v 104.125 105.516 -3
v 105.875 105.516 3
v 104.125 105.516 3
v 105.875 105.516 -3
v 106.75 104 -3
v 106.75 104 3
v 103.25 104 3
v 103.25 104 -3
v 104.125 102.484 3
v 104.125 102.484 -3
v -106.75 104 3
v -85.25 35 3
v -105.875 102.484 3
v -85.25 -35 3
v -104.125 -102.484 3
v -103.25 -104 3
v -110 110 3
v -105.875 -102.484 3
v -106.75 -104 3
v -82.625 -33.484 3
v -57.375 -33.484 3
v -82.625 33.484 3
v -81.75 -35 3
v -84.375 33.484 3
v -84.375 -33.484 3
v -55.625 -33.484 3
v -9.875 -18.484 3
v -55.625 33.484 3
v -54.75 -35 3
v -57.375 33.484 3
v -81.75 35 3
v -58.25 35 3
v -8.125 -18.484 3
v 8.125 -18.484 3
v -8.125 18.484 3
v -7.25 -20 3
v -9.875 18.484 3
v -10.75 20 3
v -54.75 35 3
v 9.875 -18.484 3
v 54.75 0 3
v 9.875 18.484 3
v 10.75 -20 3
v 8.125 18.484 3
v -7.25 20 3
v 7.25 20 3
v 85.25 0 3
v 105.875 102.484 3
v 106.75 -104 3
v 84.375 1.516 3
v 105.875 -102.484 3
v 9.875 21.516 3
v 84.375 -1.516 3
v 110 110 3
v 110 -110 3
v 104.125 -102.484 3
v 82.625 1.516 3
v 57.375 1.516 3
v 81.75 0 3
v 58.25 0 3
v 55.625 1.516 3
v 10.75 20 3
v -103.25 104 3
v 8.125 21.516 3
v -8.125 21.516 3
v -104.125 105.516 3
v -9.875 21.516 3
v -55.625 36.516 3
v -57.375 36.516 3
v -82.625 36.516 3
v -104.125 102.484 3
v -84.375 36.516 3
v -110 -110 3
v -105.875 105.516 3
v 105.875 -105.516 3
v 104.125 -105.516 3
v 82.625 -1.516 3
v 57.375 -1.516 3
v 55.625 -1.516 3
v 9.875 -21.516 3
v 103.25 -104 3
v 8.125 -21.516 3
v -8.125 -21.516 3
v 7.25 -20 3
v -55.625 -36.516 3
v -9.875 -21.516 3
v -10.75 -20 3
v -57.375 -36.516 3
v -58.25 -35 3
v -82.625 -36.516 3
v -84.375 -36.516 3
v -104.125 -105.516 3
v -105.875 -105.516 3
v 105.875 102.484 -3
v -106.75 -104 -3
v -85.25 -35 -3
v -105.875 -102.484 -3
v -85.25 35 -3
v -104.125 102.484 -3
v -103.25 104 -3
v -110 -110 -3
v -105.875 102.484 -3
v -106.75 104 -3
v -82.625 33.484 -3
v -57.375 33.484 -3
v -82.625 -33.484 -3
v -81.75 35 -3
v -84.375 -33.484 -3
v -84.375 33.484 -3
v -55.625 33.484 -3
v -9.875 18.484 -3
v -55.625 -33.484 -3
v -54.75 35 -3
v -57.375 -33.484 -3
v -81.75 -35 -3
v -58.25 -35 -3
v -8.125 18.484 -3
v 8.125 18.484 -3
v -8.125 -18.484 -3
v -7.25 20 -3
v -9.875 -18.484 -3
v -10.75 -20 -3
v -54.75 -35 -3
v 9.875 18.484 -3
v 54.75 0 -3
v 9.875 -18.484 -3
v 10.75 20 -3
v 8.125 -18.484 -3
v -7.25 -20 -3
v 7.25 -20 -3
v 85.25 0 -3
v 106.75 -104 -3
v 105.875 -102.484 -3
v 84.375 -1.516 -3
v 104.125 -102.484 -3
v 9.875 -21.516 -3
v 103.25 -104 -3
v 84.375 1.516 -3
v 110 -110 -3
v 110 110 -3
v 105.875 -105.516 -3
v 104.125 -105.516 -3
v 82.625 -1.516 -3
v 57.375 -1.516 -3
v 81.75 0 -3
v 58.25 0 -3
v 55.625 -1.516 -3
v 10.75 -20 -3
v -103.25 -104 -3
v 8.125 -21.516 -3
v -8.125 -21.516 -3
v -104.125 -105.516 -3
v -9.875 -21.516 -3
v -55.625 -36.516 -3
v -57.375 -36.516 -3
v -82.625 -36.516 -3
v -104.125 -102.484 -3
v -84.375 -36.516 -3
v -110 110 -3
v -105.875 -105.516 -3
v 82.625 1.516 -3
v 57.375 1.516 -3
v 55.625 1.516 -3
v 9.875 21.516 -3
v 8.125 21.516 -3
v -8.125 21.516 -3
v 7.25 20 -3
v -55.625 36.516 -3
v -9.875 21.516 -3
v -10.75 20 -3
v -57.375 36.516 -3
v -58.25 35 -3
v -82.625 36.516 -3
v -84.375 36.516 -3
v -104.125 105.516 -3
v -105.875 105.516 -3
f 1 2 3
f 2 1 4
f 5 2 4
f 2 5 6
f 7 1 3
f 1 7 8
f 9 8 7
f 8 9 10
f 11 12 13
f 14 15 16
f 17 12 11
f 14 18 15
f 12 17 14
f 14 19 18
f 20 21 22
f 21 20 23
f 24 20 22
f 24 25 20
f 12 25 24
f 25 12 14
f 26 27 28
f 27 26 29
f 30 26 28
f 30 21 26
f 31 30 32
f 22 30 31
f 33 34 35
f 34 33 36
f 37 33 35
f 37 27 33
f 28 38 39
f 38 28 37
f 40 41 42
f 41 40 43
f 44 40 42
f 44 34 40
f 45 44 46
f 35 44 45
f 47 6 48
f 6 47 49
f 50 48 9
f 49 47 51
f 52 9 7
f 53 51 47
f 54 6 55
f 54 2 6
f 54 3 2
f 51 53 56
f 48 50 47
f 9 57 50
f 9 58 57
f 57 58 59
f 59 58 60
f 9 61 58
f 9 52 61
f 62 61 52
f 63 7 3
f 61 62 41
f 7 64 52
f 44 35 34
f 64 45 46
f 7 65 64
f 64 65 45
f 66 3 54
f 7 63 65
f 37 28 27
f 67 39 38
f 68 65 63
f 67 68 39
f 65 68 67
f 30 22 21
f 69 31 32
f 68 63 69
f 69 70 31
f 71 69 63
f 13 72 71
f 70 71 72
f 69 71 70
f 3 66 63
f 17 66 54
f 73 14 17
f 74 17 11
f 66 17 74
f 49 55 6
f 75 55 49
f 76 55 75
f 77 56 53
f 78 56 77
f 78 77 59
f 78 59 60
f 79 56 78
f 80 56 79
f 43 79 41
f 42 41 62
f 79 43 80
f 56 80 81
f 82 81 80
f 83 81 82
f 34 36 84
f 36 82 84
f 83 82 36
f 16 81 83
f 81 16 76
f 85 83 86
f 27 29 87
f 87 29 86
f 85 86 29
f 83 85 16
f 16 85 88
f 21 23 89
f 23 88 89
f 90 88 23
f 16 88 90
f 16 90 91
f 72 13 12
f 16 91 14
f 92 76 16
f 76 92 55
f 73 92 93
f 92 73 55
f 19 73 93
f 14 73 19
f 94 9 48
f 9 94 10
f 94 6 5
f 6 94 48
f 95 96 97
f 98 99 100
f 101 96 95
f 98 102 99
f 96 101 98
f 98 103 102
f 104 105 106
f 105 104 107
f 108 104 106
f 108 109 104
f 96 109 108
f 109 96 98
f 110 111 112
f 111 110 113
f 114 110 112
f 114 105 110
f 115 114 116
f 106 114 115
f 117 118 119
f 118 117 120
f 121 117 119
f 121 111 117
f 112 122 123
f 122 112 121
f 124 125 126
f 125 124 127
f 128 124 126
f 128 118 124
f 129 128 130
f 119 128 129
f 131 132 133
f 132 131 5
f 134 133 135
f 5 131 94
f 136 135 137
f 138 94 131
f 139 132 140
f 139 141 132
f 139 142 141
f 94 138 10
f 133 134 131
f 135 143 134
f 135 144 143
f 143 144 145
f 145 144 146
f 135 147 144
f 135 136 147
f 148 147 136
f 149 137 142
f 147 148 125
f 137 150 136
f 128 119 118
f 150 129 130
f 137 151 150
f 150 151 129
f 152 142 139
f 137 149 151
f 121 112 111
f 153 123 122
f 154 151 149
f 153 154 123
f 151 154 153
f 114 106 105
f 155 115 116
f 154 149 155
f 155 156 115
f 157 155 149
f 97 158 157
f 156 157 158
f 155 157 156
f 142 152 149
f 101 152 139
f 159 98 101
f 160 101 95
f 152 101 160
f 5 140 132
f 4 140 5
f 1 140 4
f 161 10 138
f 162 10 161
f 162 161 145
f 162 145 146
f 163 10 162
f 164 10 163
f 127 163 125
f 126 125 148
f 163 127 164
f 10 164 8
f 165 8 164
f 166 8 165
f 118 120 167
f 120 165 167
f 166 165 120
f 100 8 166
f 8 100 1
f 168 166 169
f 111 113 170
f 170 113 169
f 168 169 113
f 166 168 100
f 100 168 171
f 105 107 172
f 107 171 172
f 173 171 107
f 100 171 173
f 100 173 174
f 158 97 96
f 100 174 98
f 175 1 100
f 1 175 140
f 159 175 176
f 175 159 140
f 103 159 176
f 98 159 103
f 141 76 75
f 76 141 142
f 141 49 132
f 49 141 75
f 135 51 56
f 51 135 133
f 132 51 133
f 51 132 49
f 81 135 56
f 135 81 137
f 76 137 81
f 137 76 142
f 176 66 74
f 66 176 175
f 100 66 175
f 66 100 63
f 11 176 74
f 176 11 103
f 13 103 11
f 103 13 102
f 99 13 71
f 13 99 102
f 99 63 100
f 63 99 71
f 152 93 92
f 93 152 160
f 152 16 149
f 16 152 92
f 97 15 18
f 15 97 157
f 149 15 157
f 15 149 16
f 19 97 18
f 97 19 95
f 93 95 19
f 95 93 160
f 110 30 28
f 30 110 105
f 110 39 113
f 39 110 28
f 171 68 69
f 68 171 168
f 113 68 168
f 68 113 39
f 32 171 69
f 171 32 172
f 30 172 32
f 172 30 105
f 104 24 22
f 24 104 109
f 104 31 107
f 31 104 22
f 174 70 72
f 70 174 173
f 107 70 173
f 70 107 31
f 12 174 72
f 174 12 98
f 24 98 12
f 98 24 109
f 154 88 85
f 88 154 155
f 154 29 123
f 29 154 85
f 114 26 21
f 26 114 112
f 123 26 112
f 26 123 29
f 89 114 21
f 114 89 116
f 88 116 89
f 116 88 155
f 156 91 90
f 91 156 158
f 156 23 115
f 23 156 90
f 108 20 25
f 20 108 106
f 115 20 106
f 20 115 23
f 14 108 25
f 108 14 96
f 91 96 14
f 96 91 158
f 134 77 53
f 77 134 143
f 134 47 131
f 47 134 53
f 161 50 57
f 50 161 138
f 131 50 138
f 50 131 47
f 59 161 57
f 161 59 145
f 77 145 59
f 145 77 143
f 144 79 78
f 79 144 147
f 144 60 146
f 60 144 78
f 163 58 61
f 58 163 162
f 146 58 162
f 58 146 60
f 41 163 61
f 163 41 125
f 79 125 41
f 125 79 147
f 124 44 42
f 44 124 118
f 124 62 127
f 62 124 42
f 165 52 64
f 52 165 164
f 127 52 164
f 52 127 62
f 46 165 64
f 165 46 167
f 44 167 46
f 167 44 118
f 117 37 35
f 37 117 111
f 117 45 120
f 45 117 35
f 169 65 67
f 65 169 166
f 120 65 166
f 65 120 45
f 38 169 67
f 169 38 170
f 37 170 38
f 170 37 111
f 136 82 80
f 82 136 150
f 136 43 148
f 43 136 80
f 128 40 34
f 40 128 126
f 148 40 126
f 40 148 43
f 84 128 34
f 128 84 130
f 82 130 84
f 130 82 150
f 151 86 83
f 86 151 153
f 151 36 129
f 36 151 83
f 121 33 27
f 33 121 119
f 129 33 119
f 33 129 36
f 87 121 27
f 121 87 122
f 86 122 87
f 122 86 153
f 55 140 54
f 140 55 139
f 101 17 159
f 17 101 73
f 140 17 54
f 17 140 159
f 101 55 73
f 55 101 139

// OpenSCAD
bed_length_x = 220;
bed_length_y = 220;

corner_hole_spacing_x = 210;
corner_hole_spacing_y = 208;

bearing_holes_spacing = 27;
bearing_positions = [
	[-(bed_length_x/2)+40,(bed_length_y/2)-75],
	[-(bed_length_x/2)+40,-(bed_length_y/2)+75],
	[bed_length_x/2-40,0]];

belt_clamp_spacing = 18;
belt_clamp_positions = [
	[0,(bed_length_y/2)-90],
	[0,-(bed_length_y/2)+90]];

bed_height = 6;
m3_size = 3.5;

difference() {
	cube([bed_length_x,bed_length_y,bed_height], center=true);
	corner_holes();
	bearing_holes();
	belt_clamps();
}

module corner_holes() {
	translate([corner_hole_spacing_x/2,corner_hole_spacing_y/2,0]) m3();
	translate([corner_hole_spacing_x/2,-corner_hole_spacing_y/2,0]) m3();
	translate([-corner_hole_spacing_x/2,corner_hole_spacing_y/2,0]) m3();
	translate([-corner_hole_spacing_x/2,-corner_hole_spacing_y/2,0]) m3();
}

module bearing_holes() {
	for(pos=bearing_positions)
		translate([pos[0],pos[1],0]) single_bearing_hole();
}

module belt_clamps() {
	for(pos=belt_clamp_positions)
		translate([pos[0],pos[1],0]) single_belt_clamp();
}

module single_bearing_hole() {
	for(i=[1,-1])
		translate([i*bearing_holes_spacing/2,0,0]) m3();
}

module single_belt_clamp() {
	for(i=[1,-1])
		translate([i*belt_clamp_spacing/2,0,0]) m3();
}

module m3() cylinder(h=bed_height, r=m3_size/2, center=true);
